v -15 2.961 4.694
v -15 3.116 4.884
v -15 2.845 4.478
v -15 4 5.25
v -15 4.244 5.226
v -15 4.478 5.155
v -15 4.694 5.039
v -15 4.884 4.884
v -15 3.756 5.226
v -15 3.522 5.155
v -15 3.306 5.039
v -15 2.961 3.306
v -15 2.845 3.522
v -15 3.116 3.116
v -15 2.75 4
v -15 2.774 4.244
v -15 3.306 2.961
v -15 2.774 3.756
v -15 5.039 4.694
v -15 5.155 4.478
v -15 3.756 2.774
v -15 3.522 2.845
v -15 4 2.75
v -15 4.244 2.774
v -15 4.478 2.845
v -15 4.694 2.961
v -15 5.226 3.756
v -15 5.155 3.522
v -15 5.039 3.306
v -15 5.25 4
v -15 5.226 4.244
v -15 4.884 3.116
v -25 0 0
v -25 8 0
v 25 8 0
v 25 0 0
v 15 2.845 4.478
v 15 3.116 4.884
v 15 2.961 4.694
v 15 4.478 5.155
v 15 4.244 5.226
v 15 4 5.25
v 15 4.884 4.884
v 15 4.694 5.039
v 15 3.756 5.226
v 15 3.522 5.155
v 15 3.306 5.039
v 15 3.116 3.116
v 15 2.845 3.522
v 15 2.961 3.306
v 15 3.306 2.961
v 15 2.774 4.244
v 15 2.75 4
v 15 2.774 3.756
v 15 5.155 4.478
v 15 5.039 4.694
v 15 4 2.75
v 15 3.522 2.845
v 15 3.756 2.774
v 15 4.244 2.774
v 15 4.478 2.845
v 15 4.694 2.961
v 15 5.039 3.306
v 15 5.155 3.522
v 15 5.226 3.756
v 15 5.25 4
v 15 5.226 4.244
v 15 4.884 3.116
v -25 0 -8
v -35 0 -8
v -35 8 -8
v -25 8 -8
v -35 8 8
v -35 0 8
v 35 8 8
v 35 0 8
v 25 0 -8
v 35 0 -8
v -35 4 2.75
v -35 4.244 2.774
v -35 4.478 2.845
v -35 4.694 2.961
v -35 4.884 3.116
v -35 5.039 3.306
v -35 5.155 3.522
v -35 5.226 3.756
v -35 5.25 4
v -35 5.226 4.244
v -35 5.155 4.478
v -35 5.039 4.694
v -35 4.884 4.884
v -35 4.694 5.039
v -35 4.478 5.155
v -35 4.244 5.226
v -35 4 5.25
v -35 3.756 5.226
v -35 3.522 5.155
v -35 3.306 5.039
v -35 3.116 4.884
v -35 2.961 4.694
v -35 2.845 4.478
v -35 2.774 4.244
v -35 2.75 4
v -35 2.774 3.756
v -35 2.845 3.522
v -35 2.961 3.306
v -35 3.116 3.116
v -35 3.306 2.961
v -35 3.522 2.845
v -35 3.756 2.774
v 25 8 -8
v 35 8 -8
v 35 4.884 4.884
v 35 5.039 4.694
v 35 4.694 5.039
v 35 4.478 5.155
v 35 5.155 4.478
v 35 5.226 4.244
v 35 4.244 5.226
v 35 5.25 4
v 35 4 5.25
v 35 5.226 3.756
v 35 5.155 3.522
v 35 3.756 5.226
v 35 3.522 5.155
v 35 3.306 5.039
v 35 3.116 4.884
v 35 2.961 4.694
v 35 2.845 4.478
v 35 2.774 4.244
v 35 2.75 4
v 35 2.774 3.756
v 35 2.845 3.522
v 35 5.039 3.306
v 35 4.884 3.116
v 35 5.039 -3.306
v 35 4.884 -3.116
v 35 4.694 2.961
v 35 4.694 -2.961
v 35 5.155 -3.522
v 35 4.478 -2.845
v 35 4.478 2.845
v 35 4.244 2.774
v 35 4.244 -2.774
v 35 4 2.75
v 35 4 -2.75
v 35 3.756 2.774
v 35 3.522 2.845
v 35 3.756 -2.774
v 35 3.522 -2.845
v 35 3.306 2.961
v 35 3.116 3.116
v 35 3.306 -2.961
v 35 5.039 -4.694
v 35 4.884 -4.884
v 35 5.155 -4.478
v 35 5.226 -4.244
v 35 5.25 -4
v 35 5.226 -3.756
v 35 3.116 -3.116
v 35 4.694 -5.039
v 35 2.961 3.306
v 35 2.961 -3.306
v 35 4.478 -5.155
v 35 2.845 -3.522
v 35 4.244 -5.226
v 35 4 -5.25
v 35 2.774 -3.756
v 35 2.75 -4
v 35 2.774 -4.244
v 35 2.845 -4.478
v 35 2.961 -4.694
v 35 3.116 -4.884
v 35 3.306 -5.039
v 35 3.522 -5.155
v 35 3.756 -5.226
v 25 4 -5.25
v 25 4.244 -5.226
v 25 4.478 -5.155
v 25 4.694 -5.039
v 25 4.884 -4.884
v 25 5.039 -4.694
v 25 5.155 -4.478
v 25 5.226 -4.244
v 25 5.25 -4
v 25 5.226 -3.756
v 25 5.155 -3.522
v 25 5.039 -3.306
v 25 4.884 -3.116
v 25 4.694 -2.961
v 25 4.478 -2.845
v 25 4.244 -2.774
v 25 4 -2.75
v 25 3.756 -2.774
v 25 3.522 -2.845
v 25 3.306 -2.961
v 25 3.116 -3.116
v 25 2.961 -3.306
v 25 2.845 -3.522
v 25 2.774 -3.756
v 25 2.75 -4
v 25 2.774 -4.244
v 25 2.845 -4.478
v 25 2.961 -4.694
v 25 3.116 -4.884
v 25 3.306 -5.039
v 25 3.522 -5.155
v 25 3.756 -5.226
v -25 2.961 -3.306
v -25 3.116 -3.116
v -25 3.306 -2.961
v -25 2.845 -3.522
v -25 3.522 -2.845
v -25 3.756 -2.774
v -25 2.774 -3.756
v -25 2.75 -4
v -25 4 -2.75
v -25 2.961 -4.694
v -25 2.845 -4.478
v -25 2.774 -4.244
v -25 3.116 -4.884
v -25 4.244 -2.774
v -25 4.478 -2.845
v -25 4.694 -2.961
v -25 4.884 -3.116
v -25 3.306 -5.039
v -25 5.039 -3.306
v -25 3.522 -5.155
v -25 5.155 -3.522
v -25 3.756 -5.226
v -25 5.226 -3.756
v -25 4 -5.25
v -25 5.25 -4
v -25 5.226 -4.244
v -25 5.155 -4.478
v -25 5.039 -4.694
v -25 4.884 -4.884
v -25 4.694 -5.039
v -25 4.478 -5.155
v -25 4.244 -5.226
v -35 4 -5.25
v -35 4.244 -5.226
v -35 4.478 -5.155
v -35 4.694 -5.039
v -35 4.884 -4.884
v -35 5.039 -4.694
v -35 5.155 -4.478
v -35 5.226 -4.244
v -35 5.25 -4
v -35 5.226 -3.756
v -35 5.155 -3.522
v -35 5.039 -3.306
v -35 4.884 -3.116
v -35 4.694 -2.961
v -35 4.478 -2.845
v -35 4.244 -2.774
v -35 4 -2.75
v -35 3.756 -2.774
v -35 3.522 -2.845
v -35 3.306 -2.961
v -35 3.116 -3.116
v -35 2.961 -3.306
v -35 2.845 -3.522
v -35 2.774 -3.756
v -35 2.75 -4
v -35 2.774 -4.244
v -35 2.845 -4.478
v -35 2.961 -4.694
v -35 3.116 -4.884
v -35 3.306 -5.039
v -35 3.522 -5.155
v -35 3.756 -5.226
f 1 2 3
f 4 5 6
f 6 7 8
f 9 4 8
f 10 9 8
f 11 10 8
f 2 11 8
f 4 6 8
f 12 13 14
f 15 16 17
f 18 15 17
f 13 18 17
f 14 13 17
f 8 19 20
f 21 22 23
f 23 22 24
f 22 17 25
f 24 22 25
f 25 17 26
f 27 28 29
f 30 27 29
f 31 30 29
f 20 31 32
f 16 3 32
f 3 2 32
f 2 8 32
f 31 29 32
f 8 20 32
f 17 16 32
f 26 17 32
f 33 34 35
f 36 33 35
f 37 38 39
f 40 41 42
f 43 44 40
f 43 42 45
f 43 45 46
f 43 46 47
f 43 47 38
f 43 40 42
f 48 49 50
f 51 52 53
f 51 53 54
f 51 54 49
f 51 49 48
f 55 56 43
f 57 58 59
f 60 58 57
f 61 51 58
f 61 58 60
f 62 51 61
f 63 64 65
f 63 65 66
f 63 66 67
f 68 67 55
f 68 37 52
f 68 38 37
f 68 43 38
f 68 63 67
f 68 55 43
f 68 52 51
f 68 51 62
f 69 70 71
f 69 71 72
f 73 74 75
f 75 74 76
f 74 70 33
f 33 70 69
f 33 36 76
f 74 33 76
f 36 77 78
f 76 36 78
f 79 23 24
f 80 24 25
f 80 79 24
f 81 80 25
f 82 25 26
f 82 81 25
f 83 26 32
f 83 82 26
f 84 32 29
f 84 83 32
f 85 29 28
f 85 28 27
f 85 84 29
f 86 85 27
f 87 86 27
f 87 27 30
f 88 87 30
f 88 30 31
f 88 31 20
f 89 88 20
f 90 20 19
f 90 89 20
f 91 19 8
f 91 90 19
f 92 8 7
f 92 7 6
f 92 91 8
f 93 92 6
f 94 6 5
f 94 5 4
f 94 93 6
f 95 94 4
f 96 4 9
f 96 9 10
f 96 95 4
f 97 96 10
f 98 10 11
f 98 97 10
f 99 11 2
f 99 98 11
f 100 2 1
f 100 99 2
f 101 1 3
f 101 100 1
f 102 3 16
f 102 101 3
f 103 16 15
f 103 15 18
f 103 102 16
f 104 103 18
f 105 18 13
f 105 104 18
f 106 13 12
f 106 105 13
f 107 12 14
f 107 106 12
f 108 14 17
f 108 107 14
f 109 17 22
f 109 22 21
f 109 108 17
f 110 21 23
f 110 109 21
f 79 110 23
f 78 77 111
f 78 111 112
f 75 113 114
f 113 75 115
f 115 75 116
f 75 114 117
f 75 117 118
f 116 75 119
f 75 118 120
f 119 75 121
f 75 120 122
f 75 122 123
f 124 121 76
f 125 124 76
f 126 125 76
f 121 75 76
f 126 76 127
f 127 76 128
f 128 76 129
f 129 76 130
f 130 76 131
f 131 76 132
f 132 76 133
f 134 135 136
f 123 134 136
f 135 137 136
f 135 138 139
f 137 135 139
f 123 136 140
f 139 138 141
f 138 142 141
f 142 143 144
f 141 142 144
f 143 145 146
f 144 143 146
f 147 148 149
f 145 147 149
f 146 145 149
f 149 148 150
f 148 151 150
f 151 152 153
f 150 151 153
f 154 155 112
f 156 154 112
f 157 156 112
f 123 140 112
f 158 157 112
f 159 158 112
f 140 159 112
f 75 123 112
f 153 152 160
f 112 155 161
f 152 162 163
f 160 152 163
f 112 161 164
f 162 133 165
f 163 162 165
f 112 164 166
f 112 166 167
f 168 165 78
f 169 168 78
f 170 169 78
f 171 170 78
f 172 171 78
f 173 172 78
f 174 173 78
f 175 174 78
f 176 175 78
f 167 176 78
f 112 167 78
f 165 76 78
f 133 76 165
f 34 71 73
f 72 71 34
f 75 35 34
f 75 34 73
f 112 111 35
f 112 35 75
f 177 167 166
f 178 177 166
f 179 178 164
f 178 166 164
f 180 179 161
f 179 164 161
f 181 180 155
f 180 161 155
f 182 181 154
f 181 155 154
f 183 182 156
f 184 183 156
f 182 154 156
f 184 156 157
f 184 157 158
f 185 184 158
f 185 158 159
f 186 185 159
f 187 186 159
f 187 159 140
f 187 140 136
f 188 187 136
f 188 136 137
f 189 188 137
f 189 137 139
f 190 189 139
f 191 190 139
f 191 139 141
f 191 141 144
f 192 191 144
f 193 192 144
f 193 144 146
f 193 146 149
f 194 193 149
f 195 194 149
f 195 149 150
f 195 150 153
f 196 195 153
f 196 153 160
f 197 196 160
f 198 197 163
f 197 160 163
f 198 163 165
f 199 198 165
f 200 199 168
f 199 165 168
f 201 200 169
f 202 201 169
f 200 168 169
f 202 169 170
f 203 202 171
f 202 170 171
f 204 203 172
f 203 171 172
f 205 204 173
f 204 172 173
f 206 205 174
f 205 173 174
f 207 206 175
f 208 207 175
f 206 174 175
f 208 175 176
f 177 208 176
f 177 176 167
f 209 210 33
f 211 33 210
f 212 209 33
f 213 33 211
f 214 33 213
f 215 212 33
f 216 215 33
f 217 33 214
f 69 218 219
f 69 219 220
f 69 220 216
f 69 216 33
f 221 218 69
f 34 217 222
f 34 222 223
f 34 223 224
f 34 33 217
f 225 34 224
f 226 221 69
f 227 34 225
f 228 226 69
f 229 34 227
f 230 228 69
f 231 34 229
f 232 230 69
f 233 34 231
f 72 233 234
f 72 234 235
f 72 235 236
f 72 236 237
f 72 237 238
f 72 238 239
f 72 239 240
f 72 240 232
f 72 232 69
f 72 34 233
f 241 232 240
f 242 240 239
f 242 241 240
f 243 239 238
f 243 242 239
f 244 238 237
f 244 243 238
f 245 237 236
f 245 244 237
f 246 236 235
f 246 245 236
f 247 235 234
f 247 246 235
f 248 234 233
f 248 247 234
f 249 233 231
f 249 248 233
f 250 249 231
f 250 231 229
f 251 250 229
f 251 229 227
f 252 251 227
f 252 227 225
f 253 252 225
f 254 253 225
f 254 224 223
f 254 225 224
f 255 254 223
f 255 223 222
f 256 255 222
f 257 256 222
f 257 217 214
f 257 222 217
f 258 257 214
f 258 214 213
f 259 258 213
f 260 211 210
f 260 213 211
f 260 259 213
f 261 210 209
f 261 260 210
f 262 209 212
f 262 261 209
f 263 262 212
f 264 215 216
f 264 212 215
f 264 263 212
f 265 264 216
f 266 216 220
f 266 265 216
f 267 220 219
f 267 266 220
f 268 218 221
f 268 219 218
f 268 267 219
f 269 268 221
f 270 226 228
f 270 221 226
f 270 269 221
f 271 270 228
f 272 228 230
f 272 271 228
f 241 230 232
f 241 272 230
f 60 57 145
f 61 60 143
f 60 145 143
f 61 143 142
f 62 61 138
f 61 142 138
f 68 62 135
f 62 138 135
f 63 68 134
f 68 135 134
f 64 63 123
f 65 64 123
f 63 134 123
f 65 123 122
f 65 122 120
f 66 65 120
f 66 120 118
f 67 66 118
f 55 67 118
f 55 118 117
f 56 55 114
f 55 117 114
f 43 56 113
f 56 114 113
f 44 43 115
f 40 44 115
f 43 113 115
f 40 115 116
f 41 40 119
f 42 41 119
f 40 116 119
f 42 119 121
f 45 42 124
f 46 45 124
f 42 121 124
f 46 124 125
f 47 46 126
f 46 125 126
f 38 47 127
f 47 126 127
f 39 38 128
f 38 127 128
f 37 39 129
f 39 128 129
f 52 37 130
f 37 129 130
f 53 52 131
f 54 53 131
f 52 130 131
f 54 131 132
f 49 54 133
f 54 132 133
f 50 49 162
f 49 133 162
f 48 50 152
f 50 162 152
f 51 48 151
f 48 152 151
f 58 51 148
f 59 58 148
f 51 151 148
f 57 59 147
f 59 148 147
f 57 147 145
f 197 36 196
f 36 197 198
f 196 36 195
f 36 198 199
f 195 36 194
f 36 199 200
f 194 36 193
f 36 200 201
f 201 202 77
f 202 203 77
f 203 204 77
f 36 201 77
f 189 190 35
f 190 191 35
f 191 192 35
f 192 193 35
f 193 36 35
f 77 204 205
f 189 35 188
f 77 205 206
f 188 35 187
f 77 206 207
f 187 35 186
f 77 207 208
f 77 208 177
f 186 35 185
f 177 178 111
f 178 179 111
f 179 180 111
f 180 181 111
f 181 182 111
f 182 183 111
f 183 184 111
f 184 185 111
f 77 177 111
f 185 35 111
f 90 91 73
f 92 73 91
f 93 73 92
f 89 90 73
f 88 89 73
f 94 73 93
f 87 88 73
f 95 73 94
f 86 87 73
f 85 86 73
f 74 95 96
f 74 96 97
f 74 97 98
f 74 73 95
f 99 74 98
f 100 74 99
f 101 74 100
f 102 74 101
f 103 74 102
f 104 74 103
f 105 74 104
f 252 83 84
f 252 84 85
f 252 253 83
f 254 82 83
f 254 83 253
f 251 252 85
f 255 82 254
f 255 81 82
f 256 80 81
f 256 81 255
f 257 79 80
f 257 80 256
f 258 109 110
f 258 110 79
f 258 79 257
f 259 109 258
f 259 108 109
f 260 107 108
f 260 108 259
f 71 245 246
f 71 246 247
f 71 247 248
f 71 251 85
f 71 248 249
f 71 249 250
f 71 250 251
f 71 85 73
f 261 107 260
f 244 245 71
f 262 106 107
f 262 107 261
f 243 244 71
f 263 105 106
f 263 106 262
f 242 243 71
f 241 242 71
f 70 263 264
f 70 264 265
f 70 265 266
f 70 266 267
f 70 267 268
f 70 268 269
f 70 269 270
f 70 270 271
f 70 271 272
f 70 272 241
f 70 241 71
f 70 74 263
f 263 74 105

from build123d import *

# Parameters (mm, degrees)
SKETCH_1_W          = 70
SKETCH_1_H          = 16
EXTRUDE_1_DEPTH     = 8
SKETCH_2_W          = 50
SKETCH_2_H          = 8
CUT_EXTRUDE_1_DEPTH = 37.783148315
SKETCH_3_R          = 1.25
CUT_EXTRUDE_2_DEPTH = 20


with BuildPart() as part:
    # 草图1 → 凸台-拉伸1 (new body)
    with BuildSketch(Plane(origin=(0, 0, 0), x_dir=(1, 0, 0), z_dir=(0, 1, 0))):
        Rectangle(SKETCH_1_W, SKETCH_1_H)
    extrude(amount=EXTRUDE_1_DEPTH)

    # 草图2 → 切除-拉伸1 (cut, through all)
    with BuildSketch(Plane(origin=(0, 8, 0), x_dir=(1, 0, 0), z_dir=(0, 1, 0))):
        with Locations((0, 4)):
            Rectangle(SKETCH_2_W, SKETCH_2_H)
    extrude(amount=-CUT_EXTRUDE_1_DEPTH, mode=Mode.SUBTRACT)

    # 草图3 → 切除-拉伸2 (cut)
    with BuildSketch(Plane(origin=(35, 0, 0), x_dir=(0, 0, -1), z_dir=(1, 0, 0))):
        with Locations((-4, 4)):
            Circle(SKETCH_3_R)
        with Locations((4, 4)):
            Circle(SKETCH_3_R)
    cut_extrude_2 = extrude(amount=-CUT_EXTRUDE_2_DEPTH, mode=Mode.SUBTRACT)

    # 镜向1: 切除-拉伸2 across plane
    add(cut_extrude_2.mirror(Plane(origin=(0, 0, 0), x_dir=(0, 0, 1), z_dir=(1, 0, 0))), mode=Mode.SUBTRACT)


solid = part.part
